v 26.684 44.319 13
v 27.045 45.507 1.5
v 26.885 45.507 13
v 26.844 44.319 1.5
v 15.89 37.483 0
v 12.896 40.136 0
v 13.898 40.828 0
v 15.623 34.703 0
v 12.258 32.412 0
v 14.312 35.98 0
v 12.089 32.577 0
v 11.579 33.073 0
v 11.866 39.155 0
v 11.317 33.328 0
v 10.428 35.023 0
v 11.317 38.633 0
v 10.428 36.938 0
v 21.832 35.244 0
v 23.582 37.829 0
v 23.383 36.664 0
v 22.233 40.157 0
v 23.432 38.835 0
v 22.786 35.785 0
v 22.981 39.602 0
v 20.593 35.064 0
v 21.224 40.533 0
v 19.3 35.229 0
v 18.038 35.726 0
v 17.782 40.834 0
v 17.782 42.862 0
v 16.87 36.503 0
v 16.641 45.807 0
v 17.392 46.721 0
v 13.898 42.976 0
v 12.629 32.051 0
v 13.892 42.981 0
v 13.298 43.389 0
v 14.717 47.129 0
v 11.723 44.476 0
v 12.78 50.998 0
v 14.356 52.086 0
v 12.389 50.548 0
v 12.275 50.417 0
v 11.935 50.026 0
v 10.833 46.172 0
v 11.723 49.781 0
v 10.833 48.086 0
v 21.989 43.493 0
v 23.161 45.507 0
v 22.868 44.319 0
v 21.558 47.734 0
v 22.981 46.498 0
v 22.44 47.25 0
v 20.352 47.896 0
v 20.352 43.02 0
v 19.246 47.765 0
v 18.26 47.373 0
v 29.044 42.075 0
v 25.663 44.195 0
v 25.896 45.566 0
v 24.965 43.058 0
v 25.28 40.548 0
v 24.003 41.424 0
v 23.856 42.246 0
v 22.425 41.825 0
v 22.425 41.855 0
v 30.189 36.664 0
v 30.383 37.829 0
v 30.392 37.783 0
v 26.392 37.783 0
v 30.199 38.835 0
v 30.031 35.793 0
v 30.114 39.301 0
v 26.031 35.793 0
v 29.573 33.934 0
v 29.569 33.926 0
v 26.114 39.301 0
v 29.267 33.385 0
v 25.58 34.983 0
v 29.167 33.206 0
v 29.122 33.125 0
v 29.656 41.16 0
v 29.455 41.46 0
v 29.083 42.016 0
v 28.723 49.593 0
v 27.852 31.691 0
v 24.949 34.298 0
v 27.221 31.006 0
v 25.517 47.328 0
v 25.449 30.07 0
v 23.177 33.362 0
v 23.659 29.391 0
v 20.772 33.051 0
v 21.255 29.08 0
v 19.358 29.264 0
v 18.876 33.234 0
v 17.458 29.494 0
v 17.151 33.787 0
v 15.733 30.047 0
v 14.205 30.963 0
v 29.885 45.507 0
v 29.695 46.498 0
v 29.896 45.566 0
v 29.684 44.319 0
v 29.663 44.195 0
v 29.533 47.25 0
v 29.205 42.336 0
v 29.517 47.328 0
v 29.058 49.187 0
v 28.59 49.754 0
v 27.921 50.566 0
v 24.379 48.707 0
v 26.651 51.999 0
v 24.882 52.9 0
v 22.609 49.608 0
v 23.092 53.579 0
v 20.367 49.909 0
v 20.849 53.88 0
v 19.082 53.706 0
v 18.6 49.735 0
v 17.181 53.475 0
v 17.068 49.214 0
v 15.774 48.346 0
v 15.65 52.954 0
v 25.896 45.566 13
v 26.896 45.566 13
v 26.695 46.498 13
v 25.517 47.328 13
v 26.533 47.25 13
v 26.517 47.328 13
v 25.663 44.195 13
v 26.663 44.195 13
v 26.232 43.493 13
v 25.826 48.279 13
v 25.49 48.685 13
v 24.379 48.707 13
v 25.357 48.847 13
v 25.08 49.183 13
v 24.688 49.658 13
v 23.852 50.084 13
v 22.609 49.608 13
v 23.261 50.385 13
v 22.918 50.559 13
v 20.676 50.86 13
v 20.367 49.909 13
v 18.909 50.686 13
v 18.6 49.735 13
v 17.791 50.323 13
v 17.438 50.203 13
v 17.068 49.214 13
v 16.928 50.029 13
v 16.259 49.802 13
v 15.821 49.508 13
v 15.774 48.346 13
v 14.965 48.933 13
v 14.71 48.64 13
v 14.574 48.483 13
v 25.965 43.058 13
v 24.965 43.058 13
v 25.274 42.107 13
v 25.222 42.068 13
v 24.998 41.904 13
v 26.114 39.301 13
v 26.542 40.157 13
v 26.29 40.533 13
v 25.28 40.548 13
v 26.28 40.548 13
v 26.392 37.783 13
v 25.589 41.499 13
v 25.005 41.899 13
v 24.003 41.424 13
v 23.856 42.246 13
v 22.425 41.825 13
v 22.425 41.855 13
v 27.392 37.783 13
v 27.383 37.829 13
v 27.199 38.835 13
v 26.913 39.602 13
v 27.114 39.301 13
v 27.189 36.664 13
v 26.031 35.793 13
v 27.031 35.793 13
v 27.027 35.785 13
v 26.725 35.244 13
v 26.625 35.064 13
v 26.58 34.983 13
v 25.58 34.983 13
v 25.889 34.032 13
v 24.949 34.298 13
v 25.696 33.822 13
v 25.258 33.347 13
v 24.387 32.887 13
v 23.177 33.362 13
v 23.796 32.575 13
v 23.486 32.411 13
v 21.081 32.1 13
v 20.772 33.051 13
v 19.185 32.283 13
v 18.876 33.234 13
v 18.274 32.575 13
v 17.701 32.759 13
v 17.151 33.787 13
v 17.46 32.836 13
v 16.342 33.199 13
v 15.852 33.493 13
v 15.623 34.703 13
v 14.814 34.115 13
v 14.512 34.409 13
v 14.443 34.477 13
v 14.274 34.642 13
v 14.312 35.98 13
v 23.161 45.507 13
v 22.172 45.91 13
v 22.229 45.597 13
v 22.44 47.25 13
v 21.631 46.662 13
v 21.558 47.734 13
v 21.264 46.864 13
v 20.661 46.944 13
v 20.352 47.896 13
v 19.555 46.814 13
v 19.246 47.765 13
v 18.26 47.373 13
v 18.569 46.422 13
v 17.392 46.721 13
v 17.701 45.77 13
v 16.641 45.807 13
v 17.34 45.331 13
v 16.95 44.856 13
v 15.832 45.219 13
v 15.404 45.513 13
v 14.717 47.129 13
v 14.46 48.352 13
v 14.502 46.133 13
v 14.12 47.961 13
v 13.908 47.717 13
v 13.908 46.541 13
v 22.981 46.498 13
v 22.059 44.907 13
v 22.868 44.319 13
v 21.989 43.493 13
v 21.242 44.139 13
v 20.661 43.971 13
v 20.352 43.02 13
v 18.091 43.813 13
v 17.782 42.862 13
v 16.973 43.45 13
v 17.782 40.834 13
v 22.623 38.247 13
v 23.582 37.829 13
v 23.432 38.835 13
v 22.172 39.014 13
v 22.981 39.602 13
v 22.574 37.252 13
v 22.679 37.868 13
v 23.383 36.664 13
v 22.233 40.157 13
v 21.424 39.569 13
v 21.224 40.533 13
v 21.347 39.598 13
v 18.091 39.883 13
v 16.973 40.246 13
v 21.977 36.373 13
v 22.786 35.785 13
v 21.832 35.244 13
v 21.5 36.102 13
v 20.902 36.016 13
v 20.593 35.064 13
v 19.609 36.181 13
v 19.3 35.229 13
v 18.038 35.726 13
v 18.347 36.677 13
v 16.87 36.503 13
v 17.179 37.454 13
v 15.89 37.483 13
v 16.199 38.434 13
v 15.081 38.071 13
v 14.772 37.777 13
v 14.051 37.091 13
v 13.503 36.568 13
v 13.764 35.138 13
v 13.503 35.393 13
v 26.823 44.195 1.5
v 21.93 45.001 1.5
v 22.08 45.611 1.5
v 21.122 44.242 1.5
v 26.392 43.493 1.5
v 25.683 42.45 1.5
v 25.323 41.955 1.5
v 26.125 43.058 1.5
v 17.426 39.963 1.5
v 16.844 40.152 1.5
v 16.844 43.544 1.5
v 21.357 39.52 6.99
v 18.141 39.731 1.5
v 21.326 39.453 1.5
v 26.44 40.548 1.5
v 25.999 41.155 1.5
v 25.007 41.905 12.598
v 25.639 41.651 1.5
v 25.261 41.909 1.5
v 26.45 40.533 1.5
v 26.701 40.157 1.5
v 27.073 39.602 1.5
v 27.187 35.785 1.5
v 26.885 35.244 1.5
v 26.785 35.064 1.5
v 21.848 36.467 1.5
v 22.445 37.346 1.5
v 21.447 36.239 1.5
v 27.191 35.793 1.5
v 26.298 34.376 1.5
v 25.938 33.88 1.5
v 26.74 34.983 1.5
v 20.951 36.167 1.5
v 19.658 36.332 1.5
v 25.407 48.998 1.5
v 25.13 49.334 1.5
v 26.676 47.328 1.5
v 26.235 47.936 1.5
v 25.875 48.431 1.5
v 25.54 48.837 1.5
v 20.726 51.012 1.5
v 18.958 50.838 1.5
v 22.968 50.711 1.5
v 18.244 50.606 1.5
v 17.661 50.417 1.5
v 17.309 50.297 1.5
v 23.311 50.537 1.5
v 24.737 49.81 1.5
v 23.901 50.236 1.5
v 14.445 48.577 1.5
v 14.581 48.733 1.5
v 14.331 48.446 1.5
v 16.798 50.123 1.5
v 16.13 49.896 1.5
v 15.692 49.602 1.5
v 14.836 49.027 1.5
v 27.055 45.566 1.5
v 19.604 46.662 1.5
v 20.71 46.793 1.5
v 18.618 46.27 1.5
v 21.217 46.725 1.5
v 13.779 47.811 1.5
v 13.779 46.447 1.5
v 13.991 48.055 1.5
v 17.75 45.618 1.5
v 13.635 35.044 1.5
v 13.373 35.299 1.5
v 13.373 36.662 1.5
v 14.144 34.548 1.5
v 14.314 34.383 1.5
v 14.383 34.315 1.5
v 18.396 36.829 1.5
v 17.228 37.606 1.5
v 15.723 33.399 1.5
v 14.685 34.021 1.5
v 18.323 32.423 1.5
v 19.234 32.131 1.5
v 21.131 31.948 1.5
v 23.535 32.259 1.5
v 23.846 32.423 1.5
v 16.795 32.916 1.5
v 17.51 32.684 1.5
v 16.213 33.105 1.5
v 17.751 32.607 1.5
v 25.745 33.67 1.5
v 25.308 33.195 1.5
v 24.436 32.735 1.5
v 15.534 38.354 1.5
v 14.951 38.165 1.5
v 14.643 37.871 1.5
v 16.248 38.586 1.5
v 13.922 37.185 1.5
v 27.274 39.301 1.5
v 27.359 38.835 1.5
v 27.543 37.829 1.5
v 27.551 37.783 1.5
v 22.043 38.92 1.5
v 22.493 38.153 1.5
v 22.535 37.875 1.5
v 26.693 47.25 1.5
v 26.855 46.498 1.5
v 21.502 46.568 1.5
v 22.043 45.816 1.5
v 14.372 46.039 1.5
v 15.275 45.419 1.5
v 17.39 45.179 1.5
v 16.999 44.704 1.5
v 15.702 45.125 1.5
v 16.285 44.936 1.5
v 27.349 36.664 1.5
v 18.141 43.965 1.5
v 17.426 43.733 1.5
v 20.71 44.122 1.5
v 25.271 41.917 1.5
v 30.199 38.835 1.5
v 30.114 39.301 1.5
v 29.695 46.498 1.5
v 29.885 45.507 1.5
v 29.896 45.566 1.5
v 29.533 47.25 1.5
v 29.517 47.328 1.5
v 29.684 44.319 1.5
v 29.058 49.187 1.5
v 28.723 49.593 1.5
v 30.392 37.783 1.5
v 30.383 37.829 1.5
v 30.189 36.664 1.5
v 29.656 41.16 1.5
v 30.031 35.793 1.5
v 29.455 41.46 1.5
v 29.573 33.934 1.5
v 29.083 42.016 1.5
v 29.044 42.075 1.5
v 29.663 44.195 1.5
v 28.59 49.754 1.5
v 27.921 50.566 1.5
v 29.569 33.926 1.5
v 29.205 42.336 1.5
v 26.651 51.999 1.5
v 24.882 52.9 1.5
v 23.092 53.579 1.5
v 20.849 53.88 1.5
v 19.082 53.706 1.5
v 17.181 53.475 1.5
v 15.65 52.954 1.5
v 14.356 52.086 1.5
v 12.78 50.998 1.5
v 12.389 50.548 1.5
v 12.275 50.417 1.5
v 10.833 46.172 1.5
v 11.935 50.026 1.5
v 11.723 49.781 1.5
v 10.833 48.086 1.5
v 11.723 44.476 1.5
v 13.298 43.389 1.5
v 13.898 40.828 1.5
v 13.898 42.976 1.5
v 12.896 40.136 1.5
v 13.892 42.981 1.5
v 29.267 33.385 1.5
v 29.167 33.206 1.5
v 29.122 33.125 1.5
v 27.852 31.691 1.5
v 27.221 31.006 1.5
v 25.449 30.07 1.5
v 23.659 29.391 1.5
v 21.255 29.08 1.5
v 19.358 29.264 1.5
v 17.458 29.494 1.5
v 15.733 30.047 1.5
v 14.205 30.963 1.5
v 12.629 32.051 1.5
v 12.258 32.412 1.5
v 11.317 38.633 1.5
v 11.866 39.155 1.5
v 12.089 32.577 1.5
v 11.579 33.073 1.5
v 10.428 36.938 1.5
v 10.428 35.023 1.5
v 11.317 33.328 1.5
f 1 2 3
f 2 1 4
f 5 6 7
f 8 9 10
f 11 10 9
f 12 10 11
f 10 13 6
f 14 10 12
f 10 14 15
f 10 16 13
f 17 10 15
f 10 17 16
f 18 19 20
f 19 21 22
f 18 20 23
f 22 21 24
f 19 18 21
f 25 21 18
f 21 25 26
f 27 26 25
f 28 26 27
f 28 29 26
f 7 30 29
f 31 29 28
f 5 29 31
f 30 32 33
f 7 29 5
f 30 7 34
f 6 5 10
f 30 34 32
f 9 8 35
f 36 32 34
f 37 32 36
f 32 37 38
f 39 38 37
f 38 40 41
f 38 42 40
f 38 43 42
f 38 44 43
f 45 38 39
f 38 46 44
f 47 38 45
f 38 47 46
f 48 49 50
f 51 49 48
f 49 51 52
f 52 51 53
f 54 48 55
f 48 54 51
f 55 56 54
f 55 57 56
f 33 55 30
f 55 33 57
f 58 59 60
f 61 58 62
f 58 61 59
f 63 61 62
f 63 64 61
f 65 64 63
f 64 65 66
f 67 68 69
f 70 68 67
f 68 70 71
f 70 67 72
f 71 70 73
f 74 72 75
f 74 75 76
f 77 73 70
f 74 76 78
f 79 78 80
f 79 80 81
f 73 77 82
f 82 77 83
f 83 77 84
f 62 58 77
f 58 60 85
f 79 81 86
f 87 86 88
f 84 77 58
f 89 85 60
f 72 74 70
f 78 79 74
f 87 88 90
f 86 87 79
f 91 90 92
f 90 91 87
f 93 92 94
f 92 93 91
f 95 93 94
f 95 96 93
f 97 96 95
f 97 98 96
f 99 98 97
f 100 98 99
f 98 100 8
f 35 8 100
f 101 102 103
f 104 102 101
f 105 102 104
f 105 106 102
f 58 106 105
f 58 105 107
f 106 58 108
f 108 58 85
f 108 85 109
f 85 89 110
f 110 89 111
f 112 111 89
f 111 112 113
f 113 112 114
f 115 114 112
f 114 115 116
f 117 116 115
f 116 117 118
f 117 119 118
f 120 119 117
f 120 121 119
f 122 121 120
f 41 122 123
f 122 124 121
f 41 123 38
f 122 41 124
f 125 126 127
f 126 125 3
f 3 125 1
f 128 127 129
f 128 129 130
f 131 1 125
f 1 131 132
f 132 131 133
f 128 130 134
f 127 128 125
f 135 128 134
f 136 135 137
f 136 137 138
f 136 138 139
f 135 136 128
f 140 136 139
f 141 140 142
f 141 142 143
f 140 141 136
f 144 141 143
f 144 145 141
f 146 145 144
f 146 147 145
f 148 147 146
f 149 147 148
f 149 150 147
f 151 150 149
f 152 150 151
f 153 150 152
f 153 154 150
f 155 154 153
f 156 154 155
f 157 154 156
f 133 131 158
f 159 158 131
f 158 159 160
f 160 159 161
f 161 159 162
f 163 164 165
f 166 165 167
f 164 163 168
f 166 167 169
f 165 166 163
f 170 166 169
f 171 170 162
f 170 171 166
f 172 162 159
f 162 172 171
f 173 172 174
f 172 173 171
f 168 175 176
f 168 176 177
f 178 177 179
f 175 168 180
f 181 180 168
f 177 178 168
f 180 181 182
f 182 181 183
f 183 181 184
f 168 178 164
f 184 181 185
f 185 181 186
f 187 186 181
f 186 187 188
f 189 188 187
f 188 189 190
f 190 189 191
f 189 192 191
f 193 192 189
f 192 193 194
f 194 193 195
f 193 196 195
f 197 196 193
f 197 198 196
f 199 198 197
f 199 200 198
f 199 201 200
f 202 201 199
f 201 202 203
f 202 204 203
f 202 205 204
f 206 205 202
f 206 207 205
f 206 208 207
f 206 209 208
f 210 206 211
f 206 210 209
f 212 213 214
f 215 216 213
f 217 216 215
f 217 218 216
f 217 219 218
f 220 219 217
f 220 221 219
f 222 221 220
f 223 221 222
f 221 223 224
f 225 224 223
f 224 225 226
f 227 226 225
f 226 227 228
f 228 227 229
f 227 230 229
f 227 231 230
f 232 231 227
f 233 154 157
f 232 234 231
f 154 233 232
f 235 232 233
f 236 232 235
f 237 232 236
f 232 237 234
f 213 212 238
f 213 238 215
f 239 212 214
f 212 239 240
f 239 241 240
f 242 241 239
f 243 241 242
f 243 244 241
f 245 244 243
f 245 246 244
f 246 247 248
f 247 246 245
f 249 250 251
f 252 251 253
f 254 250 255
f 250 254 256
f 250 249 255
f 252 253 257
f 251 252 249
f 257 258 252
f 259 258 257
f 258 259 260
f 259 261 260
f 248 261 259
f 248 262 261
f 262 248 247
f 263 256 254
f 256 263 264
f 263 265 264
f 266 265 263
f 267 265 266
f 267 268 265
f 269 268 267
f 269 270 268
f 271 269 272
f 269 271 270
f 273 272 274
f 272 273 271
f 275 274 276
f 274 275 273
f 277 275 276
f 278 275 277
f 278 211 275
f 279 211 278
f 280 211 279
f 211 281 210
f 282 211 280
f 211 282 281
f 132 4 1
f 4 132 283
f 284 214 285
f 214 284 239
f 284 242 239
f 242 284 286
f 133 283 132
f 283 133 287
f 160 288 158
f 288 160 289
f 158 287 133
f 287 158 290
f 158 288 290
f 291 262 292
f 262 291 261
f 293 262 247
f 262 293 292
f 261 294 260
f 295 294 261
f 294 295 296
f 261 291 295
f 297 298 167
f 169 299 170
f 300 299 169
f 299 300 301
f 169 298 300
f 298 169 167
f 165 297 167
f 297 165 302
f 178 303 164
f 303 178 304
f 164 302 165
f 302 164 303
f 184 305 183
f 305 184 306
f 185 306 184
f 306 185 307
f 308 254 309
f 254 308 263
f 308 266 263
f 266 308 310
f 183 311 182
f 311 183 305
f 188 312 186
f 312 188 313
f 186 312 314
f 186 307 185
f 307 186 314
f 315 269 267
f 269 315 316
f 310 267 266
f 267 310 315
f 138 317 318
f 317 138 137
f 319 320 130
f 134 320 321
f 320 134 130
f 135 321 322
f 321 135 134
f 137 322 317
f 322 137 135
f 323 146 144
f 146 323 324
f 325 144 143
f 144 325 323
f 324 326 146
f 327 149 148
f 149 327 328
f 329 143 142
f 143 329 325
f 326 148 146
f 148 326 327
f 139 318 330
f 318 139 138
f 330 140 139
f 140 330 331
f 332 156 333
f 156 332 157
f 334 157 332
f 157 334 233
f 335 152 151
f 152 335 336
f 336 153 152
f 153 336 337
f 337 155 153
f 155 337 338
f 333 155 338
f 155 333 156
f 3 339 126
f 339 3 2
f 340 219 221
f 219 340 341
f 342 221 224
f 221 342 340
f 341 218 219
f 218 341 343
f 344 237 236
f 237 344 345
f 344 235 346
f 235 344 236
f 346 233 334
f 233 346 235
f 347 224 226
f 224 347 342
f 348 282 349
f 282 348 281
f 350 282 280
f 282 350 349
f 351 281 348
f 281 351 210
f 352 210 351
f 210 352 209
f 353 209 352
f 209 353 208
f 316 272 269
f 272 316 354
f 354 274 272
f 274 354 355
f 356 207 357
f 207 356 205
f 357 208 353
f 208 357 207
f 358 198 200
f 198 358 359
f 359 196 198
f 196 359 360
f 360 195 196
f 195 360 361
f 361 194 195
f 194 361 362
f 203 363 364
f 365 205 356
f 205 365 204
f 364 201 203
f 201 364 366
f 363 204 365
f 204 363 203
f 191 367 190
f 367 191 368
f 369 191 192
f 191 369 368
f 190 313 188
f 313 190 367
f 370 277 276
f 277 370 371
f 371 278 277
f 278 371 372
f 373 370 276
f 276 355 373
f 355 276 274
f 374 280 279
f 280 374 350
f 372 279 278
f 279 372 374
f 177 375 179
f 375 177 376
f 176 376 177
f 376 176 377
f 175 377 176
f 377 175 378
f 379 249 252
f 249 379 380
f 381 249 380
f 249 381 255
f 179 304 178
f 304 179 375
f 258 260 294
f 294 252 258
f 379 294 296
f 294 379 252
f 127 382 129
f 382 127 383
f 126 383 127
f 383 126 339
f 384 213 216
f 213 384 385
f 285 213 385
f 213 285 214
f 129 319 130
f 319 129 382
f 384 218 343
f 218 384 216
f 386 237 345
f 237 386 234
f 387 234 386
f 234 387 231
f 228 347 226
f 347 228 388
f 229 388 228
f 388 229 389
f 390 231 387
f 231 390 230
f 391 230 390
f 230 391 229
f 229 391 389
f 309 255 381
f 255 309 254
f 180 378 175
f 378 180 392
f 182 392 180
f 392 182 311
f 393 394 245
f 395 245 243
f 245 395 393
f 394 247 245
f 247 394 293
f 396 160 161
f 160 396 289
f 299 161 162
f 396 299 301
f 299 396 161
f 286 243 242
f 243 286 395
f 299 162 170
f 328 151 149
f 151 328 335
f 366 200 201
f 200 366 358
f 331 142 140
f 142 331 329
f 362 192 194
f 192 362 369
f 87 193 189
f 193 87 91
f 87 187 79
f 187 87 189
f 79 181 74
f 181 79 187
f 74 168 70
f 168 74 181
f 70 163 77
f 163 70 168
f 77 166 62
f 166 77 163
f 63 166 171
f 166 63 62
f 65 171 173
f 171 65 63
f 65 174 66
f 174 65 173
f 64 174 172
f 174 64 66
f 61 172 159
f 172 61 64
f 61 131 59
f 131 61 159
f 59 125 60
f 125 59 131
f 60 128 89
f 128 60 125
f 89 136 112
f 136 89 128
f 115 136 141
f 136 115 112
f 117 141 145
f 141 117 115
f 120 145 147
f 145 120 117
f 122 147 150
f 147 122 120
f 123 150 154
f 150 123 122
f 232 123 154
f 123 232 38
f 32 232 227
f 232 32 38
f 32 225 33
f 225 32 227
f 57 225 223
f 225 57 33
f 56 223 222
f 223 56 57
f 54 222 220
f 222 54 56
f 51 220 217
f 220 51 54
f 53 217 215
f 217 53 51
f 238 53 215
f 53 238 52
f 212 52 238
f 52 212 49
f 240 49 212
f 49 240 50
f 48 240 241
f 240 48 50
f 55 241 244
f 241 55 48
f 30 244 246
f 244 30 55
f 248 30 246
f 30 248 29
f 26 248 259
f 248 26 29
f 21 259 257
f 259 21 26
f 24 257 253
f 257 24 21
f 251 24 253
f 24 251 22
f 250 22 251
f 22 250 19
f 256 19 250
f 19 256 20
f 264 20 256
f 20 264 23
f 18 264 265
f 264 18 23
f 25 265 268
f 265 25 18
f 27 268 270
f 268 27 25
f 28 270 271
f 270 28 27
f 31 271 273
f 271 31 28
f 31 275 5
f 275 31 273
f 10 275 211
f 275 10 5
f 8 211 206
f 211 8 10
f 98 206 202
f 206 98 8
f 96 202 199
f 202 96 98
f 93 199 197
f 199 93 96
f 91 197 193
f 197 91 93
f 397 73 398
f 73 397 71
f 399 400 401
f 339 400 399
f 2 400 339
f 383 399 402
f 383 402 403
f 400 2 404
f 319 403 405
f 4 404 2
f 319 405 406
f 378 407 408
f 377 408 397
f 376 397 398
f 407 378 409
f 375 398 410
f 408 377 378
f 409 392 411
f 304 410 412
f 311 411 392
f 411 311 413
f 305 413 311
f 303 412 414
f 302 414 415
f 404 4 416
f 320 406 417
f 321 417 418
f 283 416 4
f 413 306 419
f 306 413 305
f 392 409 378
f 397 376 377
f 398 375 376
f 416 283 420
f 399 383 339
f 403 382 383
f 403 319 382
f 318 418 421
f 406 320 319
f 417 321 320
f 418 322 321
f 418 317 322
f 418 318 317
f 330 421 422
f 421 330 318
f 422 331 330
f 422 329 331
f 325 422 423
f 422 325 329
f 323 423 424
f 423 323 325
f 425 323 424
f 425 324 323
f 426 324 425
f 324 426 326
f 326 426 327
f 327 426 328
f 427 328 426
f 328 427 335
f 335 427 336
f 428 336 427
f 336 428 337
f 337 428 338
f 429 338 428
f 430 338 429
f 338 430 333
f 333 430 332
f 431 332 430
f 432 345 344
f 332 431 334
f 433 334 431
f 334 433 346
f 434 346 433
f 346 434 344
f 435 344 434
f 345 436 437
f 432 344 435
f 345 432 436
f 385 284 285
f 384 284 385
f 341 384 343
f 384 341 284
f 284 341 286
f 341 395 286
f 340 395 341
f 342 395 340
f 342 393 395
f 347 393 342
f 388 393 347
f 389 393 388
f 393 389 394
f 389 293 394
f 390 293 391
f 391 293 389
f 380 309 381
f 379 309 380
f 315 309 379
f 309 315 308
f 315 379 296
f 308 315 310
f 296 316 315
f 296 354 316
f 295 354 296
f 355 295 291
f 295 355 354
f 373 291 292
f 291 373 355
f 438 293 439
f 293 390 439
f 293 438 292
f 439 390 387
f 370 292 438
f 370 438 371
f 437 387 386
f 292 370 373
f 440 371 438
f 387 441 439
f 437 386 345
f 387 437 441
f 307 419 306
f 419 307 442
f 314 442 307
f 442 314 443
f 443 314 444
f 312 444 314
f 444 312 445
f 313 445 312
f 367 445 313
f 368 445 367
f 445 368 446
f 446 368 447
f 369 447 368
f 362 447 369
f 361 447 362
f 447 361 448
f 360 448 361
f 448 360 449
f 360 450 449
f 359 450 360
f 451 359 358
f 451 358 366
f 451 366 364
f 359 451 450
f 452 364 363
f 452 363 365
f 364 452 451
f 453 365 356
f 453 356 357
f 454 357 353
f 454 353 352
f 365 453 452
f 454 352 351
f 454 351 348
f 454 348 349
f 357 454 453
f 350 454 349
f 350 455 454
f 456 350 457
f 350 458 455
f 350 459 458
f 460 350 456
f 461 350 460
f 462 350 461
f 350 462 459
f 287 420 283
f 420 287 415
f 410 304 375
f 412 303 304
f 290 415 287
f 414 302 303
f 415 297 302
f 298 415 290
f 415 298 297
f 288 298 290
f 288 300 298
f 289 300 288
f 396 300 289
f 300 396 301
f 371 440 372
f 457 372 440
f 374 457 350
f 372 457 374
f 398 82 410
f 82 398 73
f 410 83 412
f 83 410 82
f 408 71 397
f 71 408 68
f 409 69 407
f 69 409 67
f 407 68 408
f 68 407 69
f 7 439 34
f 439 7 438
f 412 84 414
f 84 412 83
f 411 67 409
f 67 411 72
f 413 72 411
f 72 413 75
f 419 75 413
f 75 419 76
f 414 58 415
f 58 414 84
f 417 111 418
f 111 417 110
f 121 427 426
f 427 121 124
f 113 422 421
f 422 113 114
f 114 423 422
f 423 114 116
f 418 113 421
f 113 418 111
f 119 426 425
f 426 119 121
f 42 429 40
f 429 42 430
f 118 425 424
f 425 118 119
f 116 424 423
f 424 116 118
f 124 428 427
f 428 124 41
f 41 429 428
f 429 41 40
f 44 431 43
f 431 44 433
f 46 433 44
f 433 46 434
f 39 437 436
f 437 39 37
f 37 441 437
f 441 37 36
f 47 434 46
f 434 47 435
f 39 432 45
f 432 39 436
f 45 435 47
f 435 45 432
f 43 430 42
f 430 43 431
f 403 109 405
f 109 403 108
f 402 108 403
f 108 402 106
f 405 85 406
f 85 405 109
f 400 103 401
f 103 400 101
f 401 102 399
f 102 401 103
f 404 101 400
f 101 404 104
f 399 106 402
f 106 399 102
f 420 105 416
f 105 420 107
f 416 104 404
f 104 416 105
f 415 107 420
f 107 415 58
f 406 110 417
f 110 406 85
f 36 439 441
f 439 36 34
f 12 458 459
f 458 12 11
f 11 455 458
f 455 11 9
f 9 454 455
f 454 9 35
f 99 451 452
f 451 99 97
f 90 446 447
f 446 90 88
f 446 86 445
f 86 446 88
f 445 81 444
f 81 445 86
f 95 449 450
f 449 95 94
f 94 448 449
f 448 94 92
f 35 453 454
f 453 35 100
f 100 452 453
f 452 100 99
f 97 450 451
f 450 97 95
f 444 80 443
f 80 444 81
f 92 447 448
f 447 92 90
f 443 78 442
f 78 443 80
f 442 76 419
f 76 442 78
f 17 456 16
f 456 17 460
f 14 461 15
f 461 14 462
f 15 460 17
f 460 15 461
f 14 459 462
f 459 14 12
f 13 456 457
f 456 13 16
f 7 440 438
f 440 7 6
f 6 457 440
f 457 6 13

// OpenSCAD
wallThick = 2;
cutterMinimum = 1; // Aiming for double line thickness for strength
baseHeight = 1.5;
height = 12;
flangeWidth = 4;
stampDepth = 1;
lineDepth = 1.5;
fileName = "epsilon.dxf";
cookiecutter();
//stamp();
module stamp() {
union(){
	difference() {
		difference(){
			baseShape(stampDepth + baseHeight);
			translate([0,0,baseHeight]) linear_extrude(height=stampDepth*1.1) import(file = fileName, layer = "Stamp");
		}
		translate([0,0,-1]) {
			minkowski() { outline(); cylinder(r = 0.8, h = (stampDepth + baseHeight)*2);}
		}
	}
}
}
module cookiecutter() {
	difference(){ //Cut holes in the flange
	union(){ //Add the supports and lines
	difference(){ //Cut out the inside of the cutter
		minkowski(){ 
			outline(cutterMinimum/2);
			cylinder(r1 = wallThick/3, r2 = cutterMinimum/2, h = height);
		}
		baseShape(height + baseHeight * 2);
	}
	flange();
	supports(baseHeight);
	lines(height - lineDepth);
	}
	holes(height + baseHeight * 2);
	};
}
module flange(){
  difference(){
    minkowski(){
      baseShape(baseHeight/2);
      cylinder(r = flangeWidth, h = baseHeight/2);
    }
    translate([0,0,-baseHeight/2])baseShape(baseHeight*2);
  };
}
module supports(H){
	linear_extrude(height=H) import(file = fileName, layer = "Supports");
}
module holes(H){
	translate([0,0,-H]) linear_extrude(height=H*3) import(file = fileName, layer = "Holes");
}
module baseShape(H){
	linear_extrude(height=H) import(file = fileName, layer = "CC");
}
module lines(H){
	linear_extrude(height=H) import(file = fileName, layer = "Lines");
}
module outline(thickness){
  difference(){
    minkowski(){
      baseShape(baseHeight/3);
      cylinder(r = thickness, h = baseHeight/3);
    }
    translate([0,0,-baseHeight/2]) baseShape(baseHeight*2);
  };
};
